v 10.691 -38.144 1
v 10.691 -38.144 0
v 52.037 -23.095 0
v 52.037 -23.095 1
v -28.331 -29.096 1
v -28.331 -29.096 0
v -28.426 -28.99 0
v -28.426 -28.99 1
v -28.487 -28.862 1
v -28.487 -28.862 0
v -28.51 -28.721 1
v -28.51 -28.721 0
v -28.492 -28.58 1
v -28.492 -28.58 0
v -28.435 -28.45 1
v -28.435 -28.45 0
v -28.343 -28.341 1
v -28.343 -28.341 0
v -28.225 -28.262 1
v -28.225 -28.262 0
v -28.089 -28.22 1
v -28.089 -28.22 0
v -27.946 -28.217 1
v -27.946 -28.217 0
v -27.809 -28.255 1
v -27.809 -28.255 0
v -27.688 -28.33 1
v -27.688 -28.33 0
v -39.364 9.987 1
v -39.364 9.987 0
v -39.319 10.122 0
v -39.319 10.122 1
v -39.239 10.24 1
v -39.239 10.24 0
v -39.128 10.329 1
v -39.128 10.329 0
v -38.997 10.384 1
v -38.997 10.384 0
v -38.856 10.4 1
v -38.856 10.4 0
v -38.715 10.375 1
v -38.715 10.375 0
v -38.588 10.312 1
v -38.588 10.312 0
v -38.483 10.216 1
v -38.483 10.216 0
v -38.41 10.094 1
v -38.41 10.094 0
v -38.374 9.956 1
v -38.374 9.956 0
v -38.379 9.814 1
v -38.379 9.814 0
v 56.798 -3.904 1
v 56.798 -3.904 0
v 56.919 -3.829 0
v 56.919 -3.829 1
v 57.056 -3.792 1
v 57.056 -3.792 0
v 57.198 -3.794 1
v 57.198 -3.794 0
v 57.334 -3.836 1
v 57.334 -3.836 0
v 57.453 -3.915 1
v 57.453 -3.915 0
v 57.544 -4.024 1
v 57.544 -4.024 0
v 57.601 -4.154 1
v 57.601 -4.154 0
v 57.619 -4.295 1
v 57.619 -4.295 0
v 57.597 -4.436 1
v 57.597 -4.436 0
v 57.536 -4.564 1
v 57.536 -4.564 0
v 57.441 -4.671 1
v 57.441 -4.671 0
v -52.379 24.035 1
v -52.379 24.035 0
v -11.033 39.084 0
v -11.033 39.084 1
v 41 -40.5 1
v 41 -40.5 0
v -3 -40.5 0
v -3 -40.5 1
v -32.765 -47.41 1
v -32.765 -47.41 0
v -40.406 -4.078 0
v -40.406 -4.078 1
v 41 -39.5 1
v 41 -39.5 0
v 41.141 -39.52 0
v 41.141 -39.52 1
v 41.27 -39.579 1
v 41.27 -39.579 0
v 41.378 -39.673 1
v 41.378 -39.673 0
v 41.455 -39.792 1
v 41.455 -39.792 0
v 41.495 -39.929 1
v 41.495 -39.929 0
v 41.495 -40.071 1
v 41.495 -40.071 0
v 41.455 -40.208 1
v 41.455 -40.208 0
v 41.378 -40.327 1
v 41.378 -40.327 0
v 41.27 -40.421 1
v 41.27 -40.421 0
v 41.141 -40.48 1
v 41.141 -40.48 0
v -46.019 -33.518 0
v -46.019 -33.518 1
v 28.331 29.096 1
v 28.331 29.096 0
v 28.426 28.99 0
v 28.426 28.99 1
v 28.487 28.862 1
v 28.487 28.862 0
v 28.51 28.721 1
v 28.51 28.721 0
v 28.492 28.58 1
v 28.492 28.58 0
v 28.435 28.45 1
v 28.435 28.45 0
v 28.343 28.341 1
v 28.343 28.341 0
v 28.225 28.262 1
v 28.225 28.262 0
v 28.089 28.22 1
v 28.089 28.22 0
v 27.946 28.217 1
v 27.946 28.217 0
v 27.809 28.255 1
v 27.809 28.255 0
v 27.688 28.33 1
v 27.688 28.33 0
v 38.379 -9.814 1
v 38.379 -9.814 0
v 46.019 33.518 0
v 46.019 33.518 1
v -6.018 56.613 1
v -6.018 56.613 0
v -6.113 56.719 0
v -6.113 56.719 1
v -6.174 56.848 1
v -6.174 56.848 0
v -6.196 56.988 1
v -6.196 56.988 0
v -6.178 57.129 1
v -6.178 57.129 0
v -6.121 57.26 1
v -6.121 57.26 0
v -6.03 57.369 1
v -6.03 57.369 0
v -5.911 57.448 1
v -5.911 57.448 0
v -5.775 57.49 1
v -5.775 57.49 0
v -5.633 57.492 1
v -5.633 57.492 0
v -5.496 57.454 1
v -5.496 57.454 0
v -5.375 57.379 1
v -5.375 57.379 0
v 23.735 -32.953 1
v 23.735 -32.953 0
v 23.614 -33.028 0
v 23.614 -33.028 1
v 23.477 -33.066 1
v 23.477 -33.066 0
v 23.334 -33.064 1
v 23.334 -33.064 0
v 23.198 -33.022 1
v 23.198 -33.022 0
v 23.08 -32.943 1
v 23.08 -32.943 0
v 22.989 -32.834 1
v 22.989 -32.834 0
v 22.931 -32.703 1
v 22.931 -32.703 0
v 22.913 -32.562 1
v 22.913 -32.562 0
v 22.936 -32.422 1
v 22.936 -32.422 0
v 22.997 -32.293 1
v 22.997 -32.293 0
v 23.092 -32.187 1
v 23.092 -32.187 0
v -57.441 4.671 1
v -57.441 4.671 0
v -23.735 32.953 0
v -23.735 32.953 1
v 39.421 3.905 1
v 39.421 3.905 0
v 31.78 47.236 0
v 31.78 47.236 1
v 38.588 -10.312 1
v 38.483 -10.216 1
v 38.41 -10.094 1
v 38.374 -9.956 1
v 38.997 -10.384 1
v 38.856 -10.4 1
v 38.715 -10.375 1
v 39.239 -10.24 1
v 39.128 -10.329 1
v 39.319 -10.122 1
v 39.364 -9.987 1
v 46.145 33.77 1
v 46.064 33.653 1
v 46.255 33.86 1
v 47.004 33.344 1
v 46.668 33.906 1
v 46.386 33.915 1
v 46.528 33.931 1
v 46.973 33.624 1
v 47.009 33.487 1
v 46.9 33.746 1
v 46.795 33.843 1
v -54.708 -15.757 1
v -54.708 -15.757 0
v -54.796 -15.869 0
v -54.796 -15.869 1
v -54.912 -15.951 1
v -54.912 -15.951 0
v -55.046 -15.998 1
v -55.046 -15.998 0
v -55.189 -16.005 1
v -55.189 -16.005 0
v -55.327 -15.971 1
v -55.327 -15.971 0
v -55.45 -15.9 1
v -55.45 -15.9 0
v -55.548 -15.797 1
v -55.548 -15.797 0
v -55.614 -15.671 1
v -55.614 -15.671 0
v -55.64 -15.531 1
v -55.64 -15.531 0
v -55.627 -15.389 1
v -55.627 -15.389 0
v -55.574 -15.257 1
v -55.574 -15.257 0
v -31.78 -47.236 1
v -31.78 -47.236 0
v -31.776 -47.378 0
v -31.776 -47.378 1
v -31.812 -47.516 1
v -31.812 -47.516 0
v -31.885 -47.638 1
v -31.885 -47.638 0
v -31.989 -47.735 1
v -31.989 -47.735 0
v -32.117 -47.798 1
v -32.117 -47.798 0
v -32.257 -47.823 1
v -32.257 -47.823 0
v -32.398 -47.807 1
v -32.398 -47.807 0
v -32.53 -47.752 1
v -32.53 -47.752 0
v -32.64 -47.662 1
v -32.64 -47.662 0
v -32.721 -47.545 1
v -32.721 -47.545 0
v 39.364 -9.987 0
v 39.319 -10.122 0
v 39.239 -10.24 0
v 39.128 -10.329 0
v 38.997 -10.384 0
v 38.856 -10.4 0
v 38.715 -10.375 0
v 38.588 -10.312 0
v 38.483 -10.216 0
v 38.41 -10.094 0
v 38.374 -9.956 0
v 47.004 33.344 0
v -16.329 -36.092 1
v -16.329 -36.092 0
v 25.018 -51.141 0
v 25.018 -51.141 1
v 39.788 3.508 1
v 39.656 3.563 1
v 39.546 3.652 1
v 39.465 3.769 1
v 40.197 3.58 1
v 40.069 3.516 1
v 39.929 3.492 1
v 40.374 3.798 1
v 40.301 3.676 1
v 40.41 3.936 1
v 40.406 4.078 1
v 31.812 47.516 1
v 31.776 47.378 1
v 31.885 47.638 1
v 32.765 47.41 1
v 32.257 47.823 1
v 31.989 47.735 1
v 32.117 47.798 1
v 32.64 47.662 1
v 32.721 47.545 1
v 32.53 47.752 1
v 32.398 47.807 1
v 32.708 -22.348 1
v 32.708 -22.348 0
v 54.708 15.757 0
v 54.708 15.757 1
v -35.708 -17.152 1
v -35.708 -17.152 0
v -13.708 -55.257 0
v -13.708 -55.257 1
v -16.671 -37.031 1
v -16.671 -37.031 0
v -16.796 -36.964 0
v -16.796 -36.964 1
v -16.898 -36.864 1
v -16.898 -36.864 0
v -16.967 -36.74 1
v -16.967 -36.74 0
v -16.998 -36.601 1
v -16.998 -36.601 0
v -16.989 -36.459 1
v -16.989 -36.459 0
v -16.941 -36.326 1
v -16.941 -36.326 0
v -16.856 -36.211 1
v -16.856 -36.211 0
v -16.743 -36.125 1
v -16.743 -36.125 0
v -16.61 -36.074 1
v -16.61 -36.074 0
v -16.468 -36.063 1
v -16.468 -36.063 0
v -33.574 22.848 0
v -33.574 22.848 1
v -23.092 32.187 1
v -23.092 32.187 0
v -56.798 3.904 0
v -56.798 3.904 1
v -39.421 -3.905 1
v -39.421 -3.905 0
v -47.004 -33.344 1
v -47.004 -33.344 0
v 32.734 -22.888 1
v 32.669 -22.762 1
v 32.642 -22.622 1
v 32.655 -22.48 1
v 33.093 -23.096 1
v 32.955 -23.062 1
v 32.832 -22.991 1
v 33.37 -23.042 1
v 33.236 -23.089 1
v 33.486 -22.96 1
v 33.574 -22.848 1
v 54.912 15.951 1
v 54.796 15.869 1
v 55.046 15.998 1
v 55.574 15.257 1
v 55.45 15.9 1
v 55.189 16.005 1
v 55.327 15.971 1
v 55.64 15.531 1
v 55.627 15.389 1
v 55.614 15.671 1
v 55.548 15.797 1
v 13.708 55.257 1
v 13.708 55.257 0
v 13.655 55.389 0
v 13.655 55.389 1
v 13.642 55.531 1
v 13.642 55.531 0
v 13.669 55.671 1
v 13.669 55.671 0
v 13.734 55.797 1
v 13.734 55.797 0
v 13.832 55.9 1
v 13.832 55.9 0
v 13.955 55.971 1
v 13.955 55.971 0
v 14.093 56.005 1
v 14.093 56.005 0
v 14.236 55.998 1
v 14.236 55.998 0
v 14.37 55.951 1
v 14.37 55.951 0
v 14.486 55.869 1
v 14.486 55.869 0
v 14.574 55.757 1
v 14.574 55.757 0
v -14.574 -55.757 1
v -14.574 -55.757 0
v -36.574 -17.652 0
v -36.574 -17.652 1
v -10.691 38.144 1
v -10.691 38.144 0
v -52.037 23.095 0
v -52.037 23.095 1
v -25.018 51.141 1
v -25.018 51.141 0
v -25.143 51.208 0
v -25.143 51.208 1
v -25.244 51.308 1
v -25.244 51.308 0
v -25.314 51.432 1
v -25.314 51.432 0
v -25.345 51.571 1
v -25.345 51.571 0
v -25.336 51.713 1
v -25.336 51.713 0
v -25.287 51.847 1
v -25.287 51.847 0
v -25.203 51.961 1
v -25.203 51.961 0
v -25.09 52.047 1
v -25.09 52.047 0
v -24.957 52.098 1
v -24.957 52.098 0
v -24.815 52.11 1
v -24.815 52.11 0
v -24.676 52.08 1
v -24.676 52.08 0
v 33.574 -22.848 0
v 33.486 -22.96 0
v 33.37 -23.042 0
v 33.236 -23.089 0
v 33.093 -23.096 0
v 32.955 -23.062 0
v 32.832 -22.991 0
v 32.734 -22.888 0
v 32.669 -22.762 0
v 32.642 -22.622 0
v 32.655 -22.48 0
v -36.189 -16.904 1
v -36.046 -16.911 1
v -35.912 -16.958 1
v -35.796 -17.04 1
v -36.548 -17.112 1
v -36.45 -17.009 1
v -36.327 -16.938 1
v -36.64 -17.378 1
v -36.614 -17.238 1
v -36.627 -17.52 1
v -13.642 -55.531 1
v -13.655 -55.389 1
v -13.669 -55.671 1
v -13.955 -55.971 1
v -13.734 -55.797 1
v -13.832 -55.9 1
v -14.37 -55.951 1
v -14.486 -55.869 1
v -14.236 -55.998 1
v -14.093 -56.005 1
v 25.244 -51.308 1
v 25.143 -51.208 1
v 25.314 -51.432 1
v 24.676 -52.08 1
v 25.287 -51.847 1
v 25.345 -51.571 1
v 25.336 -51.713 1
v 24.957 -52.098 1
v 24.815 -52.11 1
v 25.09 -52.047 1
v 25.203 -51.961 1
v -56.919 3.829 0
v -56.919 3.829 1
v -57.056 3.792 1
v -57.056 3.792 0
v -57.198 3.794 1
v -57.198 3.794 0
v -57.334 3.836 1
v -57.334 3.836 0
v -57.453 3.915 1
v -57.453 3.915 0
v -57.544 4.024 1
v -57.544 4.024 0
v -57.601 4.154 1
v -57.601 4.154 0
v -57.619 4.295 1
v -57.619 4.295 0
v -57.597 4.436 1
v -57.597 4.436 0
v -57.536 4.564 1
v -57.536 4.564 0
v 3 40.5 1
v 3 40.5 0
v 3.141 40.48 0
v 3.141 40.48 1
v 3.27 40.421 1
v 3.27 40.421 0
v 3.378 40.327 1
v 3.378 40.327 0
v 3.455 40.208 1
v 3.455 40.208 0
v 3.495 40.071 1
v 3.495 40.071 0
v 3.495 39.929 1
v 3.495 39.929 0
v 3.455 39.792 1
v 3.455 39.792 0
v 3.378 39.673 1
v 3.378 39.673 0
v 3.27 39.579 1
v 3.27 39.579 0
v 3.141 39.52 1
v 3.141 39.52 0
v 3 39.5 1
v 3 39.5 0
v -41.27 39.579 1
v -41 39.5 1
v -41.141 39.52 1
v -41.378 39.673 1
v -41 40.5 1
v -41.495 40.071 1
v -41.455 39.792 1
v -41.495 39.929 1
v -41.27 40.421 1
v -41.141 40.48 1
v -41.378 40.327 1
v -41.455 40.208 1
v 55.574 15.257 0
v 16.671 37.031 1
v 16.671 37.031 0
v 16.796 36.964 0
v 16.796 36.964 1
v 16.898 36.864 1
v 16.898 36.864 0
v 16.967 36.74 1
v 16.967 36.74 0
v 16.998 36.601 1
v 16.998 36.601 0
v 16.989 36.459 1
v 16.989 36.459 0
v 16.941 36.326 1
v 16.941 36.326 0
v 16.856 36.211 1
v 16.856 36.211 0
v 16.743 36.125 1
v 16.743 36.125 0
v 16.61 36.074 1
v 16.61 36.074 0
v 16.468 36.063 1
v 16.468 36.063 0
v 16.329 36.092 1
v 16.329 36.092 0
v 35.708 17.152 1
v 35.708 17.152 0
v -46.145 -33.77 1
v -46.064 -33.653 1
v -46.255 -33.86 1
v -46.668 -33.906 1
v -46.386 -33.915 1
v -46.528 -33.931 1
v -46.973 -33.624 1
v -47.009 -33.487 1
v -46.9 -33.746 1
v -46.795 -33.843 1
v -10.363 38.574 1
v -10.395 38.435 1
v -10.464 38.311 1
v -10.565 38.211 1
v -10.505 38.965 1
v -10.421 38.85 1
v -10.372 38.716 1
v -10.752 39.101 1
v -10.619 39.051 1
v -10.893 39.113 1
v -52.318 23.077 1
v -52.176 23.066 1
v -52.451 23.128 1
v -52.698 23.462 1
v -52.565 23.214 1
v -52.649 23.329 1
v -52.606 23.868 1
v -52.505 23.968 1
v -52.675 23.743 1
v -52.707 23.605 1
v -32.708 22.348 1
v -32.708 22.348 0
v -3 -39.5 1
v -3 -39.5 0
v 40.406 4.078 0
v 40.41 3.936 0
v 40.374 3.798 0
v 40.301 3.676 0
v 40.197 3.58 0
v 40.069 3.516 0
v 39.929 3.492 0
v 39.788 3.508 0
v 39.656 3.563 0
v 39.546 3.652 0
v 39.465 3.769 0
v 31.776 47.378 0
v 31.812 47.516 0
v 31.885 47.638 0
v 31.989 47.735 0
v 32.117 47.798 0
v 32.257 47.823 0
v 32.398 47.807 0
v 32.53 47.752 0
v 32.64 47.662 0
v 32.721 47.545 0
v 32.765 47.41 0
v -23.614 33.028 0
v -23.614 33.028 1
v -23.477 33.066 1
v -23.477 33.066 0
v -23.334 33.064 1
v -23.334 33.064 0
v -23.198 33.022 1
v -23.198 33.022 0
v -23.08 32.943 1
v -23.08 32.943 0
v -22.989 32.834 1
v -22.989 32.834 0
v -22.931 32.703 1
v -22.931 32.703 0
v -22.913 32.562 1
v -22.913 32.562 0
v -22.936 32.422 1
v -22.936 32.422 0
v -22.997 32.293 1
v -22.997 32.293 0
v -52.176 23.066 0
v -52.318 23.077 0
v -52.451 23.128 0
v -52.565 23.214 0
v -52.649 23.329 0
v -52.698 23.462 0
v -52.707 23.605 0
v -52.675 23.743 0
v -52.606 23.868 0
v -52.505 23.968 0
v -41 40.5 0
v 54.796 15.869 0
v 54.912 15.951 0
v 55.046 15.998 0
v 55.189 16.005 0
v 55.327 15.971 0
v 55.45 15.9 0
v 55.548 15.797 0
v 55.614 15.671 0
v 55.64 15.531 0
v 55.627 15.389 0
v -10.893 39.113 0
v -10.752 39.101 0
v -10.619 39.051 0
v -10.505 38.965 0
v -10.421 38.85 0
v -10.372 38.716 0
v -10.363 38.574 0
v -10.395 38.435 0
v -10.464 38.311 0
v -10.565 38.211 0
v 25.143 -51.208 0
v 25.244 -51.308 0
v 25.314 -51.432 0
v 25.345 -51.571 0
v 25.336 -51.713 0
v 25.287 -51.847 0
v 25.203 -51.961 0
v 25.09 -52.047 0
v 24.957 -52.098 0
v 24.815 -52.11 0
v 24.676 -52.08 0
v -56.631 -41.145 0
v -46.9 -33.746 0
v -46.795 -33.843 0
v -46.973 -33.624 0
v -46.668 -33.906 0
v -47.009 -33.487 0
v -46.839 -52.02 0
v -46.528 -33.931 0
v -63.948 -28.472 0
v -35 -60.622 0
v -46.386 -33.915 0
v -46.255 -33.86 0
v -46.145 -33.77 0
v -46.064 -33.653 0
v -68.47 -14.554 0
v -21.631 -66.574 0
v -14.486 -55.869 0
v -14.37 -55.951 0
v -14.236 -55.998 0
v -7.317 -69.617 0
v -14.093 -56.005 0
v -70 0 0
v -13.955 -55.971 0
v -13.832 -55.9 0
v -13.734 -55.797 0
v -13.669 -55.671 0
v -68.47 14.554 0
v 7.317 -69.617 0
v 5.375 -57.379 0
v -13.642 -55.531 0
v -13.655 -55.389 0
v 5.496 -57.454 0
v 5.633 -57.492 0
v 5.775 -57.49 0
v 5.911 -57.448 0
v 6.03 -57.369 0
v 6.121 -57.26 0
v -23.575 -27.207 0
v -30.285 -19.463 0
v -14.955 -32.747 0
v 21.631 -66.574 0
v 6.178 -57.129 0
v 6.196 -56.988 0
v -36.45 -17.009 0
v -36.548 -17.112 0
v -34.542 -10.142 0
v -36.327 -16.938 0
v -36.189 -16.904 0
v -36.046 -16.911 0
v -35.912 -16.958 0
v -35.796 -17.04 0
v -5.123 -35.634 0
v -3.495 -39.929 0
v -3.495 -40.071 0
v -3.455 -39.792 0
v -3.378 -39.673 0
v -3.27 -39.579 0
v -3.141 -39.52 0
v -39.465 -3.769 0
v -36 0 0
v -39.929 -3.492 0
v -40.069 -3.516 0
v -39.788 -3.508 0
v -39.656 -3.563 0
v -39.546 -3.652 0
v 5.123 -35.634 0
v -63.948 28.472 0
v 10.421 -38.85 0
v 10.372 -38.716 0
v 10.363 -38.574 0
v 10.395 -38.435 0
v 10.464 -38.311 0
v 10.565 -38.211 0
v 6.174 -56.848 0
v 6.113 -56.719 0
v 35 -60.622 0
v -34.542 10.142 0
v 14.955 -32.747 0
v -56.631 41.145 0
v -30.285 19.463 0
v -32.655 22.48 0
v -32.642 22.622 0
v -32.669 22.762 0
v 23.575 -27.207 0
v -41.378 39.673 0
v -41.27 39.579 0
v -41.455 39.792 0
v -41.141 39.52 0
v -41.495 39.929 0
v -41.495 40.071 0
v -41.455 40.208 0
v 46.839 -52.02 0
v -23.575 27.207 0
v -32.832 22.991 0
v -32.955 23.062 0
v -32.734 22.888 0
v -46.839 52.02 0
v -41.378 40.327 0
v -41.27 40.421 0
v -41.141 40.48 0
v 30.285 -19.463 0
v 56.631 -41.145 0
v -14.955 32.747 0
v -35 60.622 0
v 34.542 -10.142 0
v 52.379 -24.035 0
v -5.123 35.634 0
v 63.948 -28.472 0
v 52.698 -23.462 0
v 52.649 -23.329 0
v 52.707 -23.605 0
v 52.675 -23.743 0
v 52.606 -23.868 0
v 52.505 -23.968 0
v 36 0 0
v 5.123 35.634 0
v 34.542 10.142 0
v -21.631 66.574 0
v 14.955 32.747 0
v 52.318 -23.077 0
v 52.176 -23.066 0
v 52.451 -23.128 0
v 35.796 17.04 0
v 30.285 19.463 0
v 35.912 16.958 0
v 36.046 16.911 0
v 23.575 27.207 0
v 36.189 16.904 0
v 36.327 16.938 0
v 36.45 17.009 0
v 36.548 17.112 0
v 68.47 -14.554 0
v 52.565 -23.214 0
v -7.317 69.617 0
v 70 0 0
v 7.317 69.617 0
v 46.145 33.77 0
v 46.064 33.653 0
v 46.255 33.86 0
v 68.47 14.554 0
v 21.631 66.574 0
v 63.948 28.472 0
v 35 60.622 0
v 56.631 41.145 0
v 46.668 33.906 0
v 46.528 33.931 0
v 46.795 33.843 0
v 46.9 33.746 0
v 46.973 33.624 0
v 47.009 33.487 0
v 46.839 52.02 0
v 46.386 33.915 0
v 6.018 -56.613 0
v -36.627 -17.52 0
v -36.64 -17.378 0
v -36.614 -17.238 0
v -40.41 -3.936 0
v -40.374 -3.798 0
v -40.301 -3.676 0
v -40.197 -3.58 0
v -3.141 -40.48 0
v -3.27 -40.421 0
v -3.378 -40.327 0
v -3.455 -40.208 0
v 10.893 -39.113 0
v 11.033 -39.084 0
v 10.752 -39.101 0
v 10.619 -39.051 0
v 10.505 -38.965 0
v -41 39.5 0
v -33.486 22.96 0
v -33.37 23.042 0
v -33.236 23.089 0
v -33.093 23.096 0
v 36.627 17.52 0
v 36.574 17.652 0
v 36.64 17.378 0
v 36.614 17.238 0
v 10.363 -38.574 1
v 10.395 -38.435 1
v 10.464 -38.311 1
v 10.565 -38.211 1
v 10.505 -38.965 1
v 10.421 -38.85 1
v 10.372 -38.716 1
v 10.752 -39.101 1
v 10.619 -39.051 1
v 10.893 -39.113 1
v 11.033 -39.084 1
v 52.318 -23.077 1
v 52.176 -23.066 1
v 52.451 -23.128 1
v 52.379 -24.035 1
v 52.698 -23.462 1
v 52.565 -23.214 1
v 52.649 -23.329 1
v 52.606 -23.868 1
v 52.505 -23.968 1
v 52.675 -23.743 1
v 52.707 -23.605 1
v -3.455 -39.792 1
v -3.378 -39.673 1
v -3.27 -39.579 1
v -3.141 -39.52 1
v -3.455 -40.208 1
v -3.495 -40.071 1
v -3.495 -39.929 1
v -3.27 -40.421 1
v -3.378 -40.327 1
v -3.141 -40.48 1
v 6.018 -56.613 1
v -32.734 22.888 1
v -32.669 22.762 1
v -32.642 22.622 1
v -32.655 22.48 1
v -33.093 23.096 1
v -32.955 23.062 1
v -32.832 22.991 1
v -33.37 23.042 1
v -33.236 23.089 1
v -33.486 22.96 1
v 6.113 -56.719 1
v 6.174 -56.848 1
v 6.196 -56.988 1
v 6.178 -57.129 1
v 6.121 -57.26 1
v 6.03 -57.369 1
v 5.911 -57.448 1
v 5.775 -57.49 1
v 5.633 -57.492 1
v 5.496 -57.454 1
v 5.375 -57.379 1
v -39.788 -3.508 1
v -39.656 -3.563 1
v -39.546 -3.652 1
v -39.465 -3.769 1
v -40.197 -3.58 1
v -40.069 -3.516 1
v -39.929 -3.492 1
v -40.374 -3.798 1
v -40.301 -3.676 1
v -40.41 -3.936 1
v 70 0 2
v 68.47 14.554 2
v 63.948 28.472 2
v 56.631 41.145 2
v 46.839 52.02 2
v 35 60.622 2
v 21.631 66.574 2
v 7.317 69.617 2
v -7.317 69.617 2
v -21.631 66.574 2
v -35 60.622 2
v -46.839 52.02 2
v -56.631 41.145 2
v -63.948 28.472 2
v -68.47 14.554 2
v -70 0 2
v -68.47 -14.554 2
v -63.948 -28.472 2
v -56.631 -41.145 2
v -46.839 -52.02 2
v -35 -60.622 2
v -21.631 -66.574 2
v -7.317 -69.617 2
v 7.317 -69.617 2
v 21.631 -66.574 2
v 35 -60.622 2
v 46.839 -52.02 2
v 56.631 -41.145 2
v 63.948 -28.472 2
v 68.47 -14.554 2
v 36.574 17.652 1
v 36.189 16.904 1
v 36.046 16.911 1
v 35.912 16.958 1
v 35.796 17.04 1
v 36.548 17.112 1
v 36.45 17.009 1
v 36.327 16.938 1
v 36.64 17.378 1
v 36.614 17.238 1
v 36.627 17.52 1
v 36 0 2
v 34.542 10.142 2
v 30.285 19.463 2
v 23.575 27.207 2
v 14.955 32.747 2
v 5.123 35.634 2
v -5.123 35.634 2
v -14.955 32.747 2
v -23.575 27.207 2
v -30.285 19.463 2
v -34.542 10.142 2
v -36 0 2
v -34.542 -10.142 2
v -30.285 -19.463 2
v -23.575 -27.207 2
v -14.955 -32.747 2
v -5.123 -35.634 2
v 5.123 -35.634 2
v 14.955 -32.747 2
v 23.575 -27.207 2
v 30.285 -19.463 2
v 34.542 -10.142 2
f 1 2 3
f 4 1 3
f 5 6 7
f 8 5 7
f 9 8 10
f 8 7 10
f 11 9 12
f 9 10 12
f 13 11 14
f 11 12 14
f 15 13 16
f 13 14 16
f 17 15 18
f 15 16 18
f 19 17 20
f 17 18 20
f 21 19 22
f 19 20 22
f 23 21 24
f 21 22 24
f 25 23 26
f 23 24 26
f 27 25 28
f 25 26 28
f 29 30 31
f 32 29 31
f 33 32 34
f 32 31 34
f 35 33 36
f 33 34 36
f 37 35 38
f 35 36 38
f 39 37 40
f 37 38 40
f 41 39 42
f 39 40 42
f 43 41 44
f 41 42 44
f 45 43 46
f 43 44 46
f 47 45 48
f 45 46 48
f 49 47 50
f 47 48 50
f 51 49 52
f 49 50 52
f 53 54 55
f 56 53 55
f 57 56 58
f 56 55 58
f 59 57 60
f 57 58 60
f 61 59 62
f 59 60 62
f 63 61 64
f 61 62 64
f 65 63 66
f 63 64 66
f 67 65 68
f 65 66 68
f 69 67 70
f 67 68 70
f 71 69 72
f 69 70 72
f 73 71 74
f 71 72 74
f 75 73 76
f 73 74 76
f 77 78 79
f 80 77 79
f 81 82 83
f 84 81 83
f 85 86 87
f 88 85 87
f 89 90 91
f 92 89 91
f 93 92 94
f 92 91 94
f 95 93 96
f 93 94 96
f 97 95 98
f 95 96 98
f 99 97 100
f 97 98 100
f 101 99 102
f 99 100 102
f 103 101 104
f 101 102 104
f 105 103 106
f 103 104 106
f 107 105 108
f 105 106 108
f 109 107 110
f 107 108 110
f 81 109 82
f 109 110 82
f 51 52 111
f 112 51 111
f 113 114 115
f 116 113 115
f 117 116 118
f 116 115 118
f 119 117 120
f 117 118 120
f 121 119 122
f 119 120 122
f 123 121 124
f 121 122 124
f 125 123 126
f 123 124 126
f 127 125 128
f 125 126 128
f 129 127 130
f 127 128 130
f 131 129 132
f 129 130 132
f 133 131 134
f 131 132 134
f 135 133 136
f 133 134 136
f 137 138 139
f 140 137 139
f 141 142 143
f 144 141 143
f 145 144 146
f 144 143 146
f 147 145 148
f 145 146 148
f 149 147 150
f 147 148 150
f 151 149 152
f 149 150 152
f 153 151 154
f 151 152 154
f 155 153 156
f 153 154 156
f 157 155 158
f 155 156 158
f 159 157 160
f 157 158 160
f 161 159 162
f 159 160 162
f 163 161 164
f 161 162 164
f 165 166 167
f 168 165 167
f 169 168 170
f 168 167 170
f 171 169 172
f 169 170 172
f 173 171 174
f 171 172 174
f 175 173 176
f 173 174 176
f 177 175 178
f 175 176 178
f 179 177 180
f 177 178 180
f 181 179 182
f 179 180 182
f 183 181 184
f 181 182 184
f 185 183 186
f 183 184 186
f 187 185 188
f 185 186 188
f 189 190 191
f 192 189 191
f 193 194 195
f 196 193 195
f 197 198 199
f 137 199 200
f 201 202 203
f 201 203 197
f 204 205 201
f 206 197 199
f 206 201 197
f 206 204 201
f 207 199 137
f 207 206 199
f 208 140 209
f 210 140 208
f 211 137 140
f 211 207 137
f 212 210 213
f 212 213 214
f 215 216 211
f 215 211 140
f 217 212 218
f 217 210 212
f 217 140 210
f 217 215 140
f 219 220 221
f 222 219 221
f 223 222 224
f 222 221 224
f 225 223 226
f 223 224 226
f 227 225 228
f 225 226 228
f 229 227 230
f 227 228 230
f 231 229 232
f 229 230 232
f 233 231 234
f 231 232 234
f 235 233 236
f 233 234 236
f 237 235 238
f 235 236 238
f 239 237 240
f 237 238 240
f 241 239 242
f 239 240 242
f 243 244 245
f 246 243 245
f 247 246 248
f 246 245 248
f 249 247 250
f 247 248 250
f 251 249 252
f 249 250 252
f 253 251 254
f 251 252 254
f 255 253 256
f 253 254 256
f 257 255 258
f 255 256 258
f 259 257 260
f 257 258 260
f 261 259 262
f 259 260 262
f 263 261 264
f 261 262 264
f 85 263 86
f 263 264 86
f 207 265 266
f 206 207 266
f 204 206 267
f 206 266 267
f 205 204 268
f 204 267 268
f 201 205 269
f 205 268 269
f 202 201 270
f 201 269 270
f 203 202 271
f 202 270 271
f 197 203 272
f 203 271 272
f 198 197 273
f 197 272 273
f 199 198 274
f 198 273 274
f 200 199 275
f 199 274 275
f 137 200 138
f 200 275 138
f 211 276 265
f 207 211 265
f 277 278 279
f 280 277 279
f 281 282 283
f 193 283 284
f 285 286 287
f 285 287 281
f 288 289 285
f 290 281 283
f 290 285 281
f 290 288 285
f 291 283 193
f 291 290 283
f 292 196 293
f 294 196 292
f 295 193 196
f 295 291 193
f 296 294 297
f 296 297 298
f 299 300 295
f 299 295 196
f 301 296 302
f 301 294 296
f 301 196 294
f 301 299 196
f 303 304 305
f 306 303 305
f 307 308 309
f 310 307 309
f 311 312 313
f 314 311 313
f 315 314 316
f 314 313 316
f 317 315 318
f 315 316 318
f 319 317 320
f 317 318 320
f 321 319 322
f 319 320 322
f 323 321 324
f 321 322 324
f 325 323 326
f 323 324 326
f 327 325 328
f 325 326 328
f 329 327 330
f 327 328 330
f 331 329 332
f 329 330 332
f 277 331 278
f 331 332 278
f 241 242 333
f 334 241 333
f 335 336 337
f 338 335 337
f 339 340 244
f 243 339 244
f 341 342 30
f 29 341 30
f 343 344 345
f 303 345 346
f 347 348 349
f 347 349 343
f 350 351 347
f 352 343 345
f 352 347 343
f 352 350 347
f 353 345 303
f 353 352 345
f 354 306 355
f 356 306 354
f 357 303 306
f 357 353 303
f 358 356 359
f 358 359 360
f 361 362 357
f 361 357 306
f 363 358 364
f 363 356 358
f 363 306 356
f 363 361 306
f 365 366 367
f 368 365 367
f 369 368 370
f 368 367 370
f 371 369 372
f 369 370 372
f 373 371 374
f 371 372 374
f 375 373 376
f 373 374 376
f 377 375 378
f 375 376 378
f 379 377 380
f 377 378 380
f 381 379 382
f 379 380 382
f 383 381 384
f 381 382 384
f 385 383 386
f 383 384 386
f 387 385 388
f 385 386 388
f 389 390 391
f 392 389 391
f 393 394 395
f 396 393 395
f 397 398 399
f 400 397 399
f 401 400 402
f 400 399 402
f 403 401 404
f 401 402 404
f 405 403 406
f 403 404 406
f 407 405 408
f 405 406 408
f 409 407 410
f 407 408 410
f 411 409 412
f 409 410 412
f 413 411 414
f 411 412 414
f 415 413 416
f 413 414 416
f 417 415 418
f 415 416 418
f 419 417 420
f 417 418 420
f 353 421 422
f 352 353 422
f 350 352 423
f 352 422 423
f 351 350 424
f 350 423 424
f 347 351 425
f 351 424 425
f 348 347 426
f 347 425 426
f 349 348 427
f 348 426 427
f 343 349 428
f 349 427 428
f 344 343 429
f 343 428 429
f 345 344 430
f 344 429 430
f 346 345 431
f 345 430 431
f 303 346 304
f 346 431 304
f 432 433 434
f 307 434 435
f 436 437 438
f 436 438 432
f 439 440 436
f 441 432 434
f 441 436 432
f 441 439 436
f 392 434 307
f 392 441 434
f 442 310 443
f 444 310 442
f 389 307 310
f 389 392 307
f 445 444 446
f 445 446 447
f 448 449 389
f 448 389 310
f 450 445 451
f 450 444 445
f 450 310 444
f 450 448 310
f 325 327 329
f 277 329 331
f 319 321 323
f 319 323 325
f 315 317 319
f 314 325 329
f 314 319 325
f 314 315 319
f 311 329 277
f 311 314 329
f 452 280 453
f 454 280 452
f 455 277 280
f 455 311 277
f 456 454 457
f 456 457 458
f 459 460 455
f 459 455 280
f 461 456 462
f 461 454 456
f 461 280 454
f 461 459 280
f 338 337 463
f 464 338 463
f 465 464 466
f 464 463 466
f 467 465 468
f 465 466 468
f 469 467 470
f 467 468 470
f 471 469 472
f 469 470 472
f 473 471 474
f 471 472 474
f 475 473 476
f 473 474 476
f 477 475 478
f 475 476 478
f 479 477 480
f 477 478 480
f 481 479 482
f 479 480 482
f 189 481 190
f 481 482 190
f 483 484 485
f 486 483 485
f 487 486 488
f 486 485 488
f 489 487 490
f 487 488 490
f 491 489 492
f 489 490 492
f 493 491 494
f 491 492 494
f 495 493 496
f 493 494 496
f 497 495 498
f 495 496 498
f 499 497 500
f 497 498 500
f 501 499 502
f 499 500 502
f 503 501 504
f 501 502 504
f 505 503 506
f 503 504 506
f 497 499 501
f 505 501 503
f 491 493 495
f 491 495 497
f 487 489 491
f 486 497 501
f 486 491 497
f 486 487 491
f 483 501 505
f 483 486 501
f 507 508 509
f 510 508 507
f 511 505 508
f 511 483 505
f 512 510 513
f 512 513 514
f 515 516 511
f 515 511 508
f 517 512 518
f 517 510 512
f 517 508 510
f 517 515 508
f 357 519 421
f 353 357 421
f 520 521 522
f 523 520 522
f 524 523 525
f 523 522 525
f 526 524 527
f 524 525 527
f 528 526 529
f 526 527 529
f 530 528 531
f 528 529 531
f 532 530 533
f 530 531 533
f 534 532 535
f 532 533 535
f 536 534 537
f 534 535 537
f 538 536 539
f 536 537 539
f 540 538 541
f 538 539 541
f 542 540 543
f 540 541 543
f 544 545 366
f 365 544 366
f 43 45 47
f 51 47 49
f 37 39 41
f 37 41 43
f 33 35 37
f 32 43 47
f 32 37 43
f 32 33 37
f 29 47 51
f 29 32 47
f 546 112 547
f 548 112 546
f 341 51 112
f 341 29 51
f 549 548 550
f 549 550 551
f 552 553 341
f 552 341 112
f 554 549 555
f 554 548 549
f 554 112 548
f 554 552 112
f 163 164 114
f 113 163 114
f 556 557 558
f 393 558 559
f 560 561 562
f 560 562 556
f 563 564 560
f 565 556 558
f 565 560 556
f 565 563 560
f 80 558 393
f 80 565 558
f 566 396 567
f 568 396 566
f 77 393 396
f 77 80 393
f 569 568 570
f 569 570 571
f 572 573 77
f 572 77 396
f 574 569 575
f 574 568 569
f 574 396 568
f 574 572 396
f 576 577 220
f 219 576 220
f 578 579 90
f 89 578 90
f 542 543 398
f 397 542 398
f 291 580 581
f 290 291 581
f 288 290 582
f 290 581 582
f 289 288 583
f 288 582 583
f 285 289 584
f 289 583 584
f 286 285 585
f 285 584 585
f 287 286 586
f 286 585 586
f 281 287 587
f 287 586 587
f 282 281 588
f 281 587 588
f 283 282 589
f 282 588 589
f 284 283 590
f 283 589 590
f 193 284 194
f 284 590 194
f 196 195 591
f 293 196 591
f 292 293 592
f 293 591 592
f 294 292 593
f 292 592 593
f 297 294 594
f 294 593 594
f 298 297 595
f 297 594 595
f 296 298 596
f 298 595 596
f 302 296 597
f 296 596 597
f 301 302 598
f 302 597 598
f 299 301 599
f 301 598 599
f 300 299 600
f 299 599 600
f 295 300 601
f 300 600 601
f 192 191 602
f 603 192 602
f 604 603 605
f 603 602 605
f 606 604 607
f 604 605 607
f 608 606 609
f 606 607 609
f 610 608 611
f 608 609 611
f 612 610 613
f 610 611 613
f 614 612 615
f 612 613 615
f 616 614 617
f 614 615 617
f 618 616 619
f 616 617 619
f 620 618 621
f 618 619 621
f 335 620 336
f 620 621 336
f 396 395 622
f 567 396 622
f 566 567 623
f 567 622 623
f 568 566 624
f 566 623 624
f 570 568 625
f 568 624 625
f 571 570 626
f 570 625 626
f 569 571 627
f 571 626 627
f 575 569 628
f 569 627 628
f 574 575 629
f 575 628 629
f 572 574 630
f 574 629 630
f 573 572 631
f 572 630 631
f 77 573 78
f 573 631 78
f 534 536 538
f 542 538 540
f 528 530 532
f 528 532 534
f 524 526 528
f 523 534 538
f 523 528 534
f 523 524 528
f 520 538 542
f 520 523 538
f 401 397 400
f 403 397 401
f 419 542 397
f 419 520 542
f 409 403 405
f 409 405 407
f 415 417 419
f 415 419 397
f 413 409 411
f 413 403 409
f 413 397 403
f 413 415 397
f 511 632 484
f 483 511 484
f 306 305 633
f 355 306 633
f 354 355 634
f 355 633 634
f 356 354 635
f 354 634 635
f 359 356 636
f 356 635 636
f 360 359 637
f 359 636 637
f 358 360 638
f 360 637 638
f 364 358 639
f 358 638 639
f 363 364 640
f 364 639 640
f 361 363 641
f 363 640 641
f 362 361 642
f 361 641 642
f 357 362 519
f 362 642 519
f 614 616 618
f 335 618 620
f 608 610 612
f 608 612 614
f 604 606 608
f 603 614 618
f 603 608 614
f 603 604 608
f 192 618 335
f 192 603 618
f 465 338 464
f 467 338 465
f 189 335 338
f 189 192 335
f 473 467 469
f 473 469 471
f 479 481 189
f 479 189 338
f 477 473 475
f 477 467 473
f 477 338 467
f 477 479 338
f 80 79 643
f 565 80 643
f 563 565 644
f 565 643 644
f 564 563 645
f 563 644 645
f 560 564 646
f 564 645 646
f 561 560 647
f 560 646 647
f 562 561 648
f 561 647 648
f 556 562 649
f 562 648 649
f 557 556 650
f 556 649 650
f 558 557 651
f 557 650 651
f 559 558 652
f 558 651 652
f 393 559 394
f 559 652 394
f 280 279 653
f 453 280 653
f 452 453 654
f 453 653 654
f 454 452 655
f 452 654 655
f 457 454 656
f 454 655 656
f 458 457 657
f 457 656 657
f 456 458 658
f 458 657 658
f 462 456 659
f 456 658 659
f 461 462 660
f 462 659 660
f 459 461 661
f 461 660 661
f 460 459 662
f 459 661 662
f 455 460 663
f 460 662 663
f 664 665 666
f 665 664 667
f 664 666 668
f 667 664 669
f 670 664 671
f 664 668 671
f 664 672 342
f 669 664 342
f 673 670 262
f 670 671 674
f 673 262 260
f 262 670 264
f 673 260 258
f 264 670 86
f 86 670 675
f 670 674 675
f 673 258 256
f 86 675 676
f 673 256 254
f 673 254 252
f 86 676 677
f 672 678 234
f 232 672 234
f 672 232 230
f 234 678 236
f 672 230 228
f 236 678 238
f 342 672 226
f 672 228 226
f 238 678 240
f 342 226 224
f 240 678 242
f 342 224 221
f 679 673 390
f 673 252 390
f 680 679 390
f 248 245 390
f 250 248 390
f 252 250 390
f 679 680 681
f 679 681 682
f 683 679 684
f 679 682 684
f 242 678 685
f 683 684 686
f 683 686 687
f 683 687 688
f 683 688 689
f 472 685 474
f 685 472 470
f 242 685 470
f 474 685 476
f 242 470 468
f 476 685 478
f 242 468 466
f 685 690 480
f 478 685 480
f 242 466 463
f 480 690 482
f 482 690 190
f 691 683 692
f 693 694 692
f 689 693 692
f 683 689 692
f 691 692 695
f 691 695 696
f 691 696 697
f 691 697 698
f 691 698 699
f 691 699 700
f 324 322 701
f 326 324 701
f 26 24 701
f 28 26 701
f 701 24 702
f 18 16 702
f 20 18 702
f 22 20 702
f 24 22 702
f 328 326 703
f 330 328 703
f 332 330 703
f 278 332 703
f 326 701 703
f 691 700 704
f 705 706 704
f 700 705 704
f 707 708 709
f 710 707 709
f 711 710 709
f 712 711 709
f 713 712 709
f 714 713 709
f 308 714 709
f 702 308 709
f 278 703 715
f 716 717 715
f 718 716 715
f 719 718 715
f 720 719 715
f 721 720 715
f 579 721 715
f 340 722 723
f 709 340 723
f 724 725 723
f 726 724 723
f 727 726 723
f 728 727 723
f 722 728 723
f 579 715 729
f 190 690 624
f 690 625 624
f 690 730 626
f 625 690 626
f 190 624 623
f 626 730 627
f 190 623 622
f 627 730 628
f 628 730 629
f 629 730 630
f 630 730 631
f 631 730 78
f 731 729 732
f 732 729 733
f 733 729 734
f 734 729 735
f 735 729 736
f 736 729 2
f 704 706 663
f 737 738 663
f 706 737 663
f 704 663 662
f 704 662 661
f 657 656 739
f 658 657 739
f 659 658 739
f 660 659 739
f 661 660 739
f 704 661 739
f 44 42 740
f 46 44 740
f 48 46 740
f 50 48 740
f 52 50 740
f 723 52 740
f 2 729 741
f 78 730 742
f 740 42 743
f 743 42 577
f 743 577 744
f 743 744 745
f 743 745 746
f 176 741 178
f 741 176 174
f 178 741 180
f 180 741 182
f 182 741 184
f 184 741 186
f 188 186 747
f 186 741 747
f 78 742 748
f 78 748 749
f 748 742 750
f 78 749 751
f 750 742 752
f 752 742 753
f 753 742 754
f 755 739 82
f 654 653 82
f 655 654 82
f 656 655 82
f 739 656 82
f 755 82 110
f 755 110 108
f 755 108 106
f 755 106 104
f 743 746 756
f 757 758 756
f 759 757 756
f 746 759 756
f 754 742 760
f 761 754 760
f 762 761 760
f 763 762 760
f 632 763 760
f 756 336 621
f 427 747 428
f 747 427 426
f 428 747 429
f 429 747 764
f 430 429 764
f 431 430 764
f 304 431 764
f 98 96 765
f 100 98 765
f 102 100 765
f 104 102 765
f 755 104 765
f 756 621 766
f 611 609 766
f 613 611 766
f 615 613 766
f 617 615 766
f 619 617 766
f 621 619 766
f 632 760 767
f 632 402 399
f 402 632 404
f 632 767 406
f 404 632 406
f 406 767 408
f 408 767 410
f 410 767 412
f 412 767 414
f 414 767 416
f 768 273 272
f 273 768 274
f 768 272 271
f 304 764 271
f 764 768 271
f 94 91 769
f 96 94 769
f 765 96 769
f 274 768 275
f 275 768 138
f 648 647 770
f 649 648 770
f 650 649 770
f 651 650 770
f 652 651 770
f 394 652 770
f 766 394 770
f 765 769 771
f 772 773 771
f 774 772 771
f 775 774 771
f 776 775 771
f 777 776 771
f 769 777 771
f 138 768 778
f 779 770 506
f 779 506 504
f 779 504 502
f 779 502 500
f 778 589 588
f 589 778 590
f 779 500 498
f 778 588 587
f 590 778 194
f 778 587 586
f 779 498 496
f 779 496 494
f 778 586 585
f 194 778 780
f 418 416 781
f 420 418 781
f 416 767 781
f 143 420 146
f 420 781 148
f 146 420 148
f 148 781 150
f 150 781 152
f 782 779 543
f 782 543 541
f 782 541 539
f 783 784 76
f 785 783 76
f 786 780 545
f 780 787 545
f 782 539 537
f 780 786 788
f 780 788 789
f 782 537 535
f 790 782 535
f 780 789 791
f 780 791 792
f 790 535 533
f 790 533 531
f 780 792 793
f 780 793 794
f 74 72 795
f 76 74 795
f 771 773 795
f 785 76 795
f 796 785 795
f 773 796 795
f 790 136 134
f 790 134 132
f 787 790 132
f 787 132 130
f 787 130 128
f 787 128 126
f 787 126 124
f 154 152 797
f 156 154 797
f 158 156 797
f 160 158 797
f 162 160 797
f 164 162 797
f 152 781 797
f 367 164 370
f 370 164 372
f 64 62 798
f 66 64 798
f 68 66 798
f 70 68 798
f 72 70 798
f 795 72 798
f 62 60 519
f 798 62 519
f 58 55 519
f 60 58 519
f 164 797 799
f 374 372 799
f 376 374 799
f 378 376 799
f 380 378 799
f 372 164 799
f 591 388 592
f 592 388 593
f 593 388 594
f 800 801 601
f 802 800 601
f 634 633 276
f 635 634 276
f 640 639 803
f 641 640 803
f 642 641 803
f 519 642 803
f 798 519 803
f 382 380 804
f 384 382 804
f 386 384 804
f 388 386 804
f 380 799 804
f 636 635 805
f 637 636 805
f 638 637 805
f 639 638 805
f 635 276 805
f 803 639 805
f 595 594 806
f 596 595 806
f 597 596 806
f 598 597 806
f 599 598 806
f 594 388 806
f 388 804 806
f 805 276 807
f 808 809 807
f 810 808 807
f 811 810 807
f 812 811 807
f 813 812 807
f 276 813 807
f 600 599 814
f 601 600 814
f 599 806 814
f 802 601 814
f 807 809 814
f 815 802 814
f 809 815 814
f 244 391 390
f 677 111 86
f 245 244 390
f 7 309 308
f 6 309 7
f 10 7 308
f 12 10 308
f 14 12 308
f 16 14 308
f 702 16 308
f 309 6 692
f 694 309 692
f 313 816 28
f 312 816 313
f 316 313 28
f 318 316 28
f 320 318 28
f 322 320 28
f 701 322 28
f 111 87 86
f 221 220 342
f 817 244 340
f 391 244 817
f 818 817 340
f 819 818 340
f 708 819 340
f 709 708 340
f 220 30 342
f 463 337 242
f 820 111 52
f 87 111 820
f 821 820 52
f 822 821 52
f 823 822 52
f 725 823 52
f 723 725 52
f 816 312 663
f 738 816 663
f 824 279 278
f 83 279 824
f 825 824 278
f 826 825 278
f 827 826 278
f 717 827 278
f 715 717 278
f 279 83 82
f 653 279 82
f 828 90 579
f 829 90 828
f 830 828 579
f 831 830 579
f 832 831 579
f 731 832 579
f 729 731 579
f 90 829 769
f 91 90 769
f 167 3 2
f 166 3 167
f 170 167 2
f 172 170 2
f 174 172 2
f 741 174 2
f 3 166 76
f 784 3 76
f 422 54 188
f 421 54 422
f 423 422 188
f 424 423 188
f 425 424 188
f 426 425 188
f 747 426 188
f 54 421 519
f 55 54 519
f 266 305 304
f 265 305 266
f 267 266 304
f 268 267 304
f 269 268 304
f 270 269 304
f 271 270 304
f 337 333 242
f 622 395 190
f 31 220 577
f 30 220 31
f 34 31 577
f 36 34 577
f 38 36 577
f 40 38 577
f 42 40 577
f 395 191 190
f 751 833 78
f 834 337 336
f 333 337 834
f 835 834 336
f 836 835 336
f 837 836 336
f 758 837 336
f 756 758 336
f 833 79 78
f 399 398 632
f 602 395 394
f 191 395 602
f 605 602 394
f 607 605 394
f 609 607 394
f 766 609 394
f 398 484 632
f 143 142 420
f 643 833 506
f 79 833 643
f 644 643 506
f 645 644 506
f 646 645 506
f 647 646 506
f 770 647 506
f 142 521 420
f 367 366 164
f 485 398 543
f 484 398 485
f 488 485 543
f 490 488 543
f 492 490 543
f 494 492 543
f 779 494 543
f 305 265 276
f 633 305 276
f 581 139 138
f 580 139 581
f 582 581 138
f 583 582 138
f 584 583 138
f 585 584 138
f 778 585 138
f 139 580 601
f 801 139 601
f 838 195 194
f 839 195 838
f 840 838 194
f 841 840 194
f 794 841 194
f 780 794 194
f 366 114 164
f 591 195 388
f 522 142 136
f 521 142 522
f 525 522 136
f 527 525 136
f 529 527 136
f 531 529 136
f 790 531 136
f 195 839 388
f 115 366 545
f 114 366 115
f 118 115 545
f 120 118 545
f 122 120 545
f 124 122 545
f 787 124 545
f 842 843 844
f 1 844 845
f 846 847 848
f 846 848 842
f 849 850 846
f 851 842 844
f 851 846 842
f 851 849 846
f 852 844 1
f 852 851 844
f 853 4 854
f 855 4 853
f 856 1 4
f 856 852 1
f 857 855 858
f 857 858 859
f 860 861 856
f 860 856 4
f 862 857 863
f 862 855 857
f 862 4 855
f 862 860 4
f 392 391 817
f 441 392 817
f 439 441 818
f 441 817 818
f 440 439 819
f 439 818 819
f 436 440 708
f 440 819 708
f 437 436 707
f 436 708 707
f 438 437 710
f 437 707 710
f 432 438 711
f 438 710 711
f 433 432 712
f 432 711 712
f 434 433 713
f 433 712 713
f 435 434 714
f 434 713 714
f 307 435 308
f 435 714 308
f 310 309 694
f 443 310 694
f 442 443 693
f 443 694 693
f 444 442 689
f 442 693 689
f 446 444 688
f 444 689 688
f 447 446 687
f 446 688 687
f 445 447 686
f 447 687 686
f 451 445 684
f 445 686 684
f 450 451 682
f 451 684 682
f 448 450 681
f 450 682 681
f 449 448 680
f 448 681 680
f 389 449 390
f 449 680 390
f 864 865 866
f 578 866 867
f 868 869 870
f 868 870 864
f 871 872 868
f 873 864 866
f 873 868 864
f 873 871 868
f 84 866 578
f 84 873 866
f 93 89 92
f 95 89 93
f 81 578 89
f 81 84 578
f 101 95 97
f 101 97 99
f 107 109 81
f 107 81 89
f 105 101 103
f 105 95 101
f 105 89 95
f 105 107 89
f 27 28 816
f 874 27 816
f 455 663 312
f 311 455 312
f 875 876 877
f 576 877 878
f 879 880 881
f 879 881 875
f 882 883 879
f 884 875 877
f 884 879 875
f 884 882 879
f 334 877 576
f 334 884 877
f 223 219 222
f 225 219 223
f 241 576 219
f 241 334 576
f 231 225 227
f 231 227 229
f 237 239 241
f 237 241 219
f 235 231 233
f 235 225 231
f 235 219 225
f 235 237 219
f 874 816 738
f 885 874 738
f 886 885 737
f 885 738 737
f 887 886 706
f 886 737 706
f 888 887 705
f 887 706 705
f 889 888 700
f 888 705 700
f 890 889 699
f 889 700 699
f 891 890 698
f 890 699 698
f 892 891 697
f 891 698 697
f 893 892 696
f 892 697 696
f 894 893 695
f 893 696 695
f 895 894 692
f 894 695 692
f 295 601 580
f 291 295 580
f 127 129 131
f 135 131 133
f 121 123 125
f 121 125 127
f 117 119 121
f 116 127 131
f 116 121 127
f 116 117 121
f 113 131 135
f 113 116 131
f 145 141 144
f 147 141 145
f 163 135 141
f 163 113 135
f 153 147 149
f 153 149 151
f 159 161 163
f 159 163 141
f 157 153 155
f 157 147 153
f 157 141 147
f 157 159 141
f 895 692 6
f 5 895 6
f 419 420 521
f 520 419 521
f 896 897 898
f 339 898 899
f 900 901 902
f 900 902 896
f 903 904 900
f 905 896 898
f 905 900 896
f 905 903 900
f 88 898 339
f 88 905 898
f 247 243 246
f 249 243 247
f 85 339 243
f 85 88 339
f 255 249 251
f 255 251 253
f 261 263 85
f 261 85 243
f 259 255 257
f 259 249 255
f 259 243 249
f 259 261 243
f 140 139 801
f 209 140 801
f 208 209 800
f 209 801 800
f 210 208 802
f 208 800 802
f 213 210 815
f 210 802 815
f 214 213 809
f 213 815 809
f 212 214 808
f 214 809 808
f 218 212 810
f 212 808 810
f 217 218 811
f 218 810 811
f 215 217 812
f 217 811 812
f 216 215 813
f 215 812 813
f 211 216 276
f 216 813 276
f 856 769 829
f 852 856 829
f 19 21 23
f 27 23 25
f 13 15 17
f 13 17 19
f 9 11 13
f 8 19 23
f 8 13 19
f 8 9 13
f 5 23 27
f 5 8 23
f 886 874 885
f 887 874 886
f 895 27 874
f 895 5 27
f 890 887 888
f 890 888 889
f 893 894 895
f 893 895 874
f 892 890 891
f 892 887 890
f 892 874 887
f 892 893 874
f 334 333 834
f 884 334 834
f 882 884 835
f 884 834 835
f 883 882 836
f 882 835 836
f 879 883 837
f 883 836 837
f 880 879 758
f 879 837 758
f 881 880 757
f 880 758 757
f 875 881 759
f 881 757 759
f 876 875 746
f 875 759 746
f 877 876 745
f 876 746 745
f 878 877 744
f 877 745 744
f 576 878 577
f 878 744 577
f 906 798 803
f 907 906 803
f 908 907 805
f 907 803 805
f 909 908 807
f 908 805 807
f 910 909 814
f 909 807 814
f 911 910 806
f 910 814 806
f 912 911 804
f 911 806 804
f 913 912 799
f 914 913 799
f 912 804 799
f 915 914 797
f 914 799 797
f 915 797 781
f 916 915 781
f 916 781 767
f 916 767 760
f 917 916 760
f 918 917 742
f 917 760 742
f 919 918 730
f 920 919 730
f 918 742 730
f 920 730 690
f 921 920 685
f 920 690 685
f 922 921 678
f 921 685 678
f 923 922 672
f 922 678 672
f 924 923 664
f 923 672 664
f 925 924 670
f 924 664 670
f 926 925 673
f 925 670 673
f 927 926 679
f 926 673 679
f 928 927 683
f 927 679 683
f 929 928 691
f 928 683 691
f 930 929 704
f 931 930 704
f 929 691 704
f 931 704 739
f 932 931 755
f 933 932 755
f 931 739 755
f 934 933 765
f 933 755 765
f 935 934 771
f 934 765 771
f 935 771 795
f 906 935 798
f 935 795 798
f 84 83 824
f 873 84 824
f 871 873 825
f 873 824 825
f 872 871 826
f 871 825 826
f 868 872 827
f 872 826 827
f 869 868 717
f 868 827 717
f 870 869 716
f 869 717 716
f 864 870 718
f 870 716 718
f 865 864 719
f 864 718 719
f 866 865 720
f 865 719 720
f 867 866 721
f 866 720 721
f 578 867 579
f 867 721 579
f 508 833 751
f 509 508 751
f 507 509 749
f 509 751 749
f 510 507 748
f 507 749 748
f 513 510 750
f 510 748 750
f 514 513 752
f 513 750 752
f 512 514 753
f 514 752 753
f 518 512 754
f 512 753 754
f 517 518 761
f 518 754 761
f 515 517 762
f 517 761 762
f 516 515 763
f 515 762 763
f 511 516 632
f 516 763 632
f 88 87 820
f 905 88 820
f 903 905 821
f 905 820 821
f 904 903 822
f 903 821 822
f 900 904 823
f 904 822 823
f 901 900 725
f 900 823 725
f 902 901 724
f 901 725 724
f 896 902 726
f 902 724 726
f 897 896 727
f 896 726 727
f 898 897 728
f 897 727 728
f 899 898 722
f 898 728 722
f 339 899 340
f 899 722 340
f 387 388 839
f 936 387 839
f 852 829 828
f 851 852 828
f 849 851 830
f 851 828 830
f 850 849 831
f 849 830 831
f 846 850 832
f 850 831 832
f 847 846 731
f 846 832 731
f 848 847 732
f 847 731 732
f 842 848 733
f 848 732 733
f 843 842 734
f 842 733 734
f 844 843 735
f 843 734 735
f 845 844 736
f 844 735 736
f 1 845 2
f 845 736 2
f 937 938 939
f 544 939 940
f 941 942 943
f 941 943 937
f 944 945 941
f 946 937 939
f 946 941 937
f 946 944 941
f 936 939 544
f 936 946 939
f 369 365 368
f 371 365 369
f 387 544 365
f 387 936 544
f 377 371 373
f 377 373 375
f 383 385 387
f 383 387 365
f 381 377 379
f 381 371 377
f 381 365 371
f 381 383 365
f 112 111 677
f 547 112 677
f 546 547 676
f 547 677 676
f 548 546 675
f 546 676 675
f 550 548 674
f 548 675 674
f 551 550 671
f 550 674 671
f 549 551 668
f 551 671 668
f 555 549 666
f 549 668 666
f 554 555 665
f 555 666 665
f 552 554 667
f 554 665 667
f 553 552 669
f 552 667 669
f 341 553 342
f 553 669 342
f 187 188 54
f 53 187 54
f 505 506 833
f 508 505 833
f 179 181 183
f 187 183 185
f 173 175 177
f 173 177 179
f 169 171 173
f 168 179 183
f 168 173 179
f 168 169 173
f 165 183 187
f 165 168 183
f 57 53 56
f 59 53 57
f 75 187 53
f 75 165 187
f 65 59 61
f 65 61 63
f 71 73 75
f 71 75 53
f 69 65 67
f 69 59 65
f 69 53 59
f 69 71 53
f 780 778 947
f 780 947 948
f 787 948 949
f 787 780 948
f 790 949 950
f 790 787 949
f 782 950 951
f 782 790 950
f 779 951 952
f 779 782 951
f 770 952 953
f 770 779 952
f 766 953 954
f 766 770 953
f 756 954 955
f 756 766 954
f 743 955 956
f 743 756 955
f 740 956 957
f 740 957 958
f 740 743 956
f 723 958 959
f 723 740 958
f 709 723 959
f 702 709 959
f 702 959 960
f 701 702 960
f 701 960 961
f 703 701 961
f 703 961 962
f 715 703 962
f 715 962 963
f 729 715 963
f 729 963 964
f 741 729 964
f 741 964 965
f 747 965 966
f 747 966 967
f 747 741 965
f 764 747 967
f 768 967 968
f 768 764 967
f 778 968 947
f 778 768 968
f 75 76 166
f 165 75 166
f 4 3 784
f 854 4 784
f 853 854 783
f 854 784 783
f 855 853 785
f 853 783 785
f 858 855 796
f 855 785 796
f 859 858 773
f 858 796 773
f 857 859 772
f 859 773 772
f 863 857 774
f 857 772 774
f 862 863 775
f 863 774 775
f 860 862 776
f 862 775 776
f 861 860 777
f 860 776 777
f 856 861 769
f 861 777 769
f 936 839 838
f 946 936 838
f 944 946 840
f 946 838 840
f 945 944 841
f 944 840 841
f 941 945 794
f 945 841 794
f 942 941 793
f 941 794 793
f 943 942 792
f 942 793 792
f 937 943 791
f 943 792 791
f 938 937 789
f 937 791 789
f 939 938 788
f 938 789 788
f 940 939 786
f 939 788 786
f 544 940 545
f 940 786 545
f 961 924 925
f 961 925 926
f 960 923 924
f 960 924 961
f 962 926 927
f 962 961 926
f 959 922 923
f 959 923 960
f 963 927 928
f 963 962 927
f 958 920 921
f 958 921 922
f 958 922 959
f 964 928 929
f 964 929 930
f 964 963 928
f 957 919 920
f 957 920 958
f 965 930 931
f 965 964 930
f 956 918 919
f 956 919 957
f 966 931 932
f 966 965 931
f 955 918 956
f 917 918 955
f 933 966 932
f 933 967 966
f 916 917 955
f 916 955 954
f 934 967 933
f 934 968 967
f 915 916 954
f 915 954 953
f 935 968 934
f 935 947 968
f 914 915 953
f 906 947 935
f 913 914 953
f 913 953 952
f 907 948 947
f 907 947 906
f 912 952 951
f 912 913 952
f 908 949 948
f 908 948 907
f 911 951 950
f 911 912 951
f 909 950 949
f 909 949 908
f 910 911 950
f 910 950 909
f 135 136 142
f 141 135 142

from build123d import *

# Parameters (mm, degrees)
SKETCH1_R           = 70
SKETCH1_R_2         = 36
BOSS_EXTRUDE1_DEPTH = 2
CUT_EXTRUDE1_DEPTH  = 1
CIRPATTERN1_COUNT   = 18


with BuildPart() as part:
    # Sketch1 → Boss-Extrude1 (new body)
    with BuildSketch(Plane.XY):
        Circle(SKETCH1_R)
        Circle(SKETCH1_R_2, mode=Mode.SUBTRACT)
    extrude(amount=BOSS_EXTRUDE1_DEPTH)

    # Sketch2 → Cut-Extrude1 (cut)
    with BuildSketch(Plane.XY):
        with BuildLine():
            Line((-41, 40.5), (3, 40.5))
            ThreePointArc((3, 40.5), (3.5, 40), (3, 39.5))
            Line((3, 39.5), (-41, 39.5))
            ThreePointArc((-41, 39.5), (-41.5, 40), (-41, 40.5))
        make_face()
    cut_extrude1 = extrude(amount=CUT_EXTRUDE1_DEPTH, mode=Mode.SUBTRACT)

    # CirPattern1: Cut-Extrude1 ×18 about axis
    cirpattern1_axis = Axis((0, 0, 0), (0, 0, 1))
    for i in range(1, CIRPATTERN1_COUNT):
        add(cut_extrude1.rotate(cirpattern1_axis, i * 360 / CIRPATTERN1_COUNT), mode=Mode.SUBTRACT)


solid = part.part
